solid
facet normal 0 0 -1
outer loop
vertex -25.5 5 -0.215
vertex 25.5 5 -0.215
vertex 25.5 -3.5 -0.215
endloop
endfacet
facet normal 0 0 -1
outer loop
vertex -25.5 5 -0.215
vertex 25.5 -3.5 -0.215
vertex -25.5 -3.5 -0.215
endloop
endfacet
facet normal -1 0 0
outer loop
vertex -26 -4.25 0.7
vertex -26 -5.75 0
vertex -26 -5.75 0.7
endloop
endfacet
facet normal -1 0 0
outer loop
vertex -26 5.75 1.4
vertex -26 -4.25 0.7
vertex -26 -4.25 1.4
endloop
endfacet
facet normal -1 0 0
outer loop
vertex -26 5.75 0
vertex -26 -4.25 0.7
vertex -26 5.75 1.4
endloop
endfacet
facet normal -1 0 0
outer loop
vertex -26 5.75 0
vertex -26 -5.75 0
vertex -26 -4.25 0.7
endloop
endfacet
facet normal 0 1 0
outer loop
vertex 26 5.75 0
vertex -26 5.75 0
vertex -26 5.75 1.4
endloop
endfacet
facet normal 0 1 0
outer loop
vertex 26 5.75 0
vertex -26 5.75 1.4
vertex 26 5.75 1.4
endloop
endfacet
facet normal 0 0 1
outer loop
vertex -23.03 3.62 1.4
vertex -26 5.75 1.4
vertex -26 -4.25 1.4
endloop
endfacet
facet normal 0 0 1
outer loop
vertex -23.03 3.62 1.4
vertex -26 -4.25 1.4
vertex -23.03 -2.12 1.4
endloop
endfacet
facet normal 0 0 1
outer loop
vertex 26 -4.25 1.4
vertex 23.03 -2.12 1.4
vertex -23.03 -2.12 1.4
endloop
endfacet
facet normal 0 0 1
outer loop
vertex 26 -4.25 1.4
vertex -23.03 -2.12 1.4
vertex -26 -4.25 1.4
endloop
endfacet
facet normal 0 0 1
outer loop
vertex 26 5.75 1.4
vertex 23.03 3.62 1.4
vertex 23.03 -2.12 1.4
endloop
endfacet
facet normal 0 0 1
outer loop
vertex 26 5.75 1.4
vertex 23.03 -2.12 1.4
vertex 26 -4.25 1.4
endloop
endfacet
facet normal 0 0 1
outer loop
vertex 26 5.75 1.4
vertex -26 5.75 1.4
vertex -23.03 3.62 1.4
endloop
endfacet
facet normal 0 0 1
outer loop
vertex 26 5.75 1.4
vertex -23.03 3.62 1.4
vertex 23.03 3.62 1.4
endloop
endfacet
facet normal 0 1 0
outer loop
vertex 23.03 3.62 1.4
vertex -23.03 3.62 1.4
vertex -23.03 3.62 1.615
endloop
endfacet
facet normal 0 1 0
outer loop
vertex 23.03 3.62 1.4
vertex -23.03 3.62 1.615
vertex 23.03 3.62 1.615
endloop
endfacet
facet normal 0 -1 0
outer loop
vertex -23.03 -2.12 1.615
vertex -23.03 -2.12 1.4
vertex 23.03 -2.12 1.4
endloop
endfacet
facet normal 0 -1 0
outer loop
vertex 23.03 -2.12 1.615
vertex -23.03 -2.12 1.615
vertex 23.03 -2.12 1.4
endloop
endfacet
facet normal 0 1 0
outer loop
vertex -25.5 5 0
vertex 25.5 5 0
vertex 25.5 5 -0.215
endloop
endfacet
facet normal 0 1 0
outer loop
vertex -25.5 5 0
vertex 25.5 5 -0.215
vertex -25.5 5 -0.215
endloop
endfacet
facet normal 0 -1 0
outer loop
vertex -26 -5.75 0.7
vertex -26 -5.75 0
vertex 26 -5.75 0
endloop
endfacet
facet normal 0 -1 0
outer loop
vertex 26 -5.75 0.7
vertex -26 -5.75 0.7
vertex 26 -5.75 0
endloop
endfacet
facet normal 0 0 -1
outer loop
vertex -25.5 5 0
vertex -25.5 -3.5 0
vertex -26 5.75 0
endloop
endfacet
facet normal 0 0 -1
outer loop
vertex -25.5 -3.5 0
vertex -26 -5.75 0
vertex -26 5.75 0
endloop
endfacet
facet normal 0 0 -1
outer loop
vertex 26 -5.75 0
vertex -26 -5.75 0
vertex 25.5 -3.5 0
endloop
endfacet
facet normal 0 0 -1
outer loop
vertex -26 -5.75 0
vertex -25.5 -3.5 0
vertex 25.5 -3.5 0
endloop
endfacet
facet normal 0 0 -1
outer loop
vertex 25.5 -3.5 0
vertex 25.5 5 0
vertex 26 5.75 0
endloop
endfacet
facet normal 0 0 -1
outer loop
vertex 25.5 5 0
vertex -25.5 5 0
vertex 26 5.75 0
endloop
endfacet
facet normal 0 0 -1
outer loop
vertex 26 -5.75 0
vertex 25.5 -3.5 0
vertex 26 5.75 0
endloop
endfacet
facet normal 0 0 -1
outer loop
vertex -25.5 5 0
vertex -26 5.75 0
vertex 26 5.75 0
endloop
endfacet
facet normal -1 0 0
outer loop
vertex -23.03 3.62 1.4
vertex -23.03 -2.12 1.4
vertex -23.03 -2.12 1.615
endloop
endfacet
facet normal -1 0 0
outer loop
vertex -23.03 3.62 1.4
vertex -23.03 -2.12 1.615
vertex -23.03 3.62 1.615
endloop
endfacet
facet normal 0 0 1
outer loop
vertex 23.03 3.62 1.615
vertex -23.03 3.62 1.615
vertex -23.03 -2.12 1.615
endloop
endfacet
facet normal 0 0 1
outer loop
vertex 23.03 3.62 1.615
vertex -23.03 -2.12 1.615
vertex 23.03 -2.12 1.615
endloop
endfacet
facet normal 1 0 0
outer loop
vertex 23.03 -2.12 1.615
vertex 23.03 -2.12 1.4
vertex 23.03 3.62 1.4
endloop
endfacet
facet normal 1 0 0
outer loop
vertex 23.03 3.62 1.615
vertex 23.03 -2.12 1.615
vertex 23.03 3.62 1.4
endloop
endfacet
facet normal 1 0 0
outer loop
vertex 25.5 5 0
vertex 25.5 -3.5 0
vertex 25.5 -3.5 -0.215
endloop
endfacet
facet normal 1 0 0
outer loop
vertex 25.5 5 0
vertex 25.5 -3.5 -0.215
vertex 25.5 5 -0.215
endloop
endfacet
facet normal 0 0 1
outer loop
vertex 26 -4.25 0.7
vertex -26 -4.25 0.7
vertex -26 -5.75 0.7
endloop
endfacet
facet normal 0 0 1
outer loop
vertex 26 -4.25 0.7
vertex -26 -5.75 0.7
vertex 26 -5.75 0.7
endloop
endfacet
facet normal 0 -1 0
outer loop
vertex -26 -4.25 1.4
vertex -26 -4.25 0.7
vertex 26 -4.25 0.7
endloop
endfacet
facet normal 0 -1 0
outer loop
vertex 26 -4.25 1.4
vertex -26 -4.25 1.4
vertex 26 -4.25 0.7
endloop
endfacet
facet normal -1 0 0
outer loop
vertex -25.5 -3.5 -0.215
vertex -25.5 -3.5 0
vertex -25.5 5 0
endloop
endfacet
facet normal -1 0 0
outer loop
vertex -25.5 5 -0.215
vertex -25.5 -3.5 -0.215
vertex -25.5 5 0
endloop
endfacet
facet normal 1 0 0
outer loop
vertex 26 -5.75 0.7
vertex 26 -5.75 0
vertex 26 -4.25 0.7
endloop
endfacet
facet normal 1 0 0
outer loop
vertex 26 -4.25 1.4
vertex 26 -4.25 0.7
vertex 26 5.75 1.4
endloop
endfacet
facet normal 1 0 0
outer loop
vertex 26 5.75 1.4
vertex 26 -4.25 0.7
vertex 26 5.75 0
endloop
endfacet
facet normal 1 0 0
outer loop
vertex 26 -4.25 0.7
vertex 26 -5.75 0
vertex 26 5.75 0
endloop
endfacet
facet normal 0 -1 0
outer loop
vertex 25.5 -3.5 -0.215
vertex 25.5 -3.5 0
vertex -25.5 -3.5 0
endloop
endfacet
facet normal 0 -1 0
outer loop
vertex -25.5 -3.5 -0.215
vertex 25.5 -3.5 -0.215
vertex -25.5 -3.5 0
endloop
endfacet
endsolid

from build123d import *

# Parameters (mm, degrees)
SKETCH1_W           = 52
SKETCH1_H           = 11.5
BOSS_EXTRUDE1_DEPTH = 0.7
SKETCH2_W           = 52
SKETCH2_H           = 10
BOSS_EXTRUDE2_DEPTH = 0.7
SKETCH3_W           = 46.06
SKETCH3_H           = 5.74
BOSS_EXTRUDE3_DEPTH = 0.215
SKETCH4_W           = 51
SKETCH4_H           = 8.5
BOSS_EXTRUDE4_DEPTH = 0.215


with BuildPart() as part:
    # Sketch1 → Boss-Extrude1 (new body)
    with BuildSketch(Plane.XY):
        Rectangle(SKETCH1_W, SKETCH1_H)
    extrude(amount=BOSS_EXTRUDE1_DEPTH)

    # Sketch2 → Boss-Extrude2 (add)
    with BuildSketch(Plane.XY.offset(0.7)):
        with Locations((0, 0.75)):
            Rectangle(SKETCH2_W, SKETCH2_H)
    extrude(amount=BOSS_EXTRUDE2_DEPTH)

    # Sketch3 → Boss-Extrude3 (add)
    with BuildSketch(Plane.XY.offset(1.4)):
        with Locations((0, 0.75)):
            Rectangle(SKETCH3_W, SKETCH3_H)
    extrude(amount=BOSS_EXTRUDE3_DEPTH)

    # Sketch4 → Boss-Extrude4 (add)
    with BuildSketch(Plane(origin=(0, 0, 0), x_dir=(-1, 0, 0), z_dir=(0, 0, -1))):
        with Locations((0, 0.75)):
            Rectangle(SKETCH4_W, SKETCH4_H)
    extrude(amount=BOSS_EXTRUDE4_DEPTH)


solid = part.part
